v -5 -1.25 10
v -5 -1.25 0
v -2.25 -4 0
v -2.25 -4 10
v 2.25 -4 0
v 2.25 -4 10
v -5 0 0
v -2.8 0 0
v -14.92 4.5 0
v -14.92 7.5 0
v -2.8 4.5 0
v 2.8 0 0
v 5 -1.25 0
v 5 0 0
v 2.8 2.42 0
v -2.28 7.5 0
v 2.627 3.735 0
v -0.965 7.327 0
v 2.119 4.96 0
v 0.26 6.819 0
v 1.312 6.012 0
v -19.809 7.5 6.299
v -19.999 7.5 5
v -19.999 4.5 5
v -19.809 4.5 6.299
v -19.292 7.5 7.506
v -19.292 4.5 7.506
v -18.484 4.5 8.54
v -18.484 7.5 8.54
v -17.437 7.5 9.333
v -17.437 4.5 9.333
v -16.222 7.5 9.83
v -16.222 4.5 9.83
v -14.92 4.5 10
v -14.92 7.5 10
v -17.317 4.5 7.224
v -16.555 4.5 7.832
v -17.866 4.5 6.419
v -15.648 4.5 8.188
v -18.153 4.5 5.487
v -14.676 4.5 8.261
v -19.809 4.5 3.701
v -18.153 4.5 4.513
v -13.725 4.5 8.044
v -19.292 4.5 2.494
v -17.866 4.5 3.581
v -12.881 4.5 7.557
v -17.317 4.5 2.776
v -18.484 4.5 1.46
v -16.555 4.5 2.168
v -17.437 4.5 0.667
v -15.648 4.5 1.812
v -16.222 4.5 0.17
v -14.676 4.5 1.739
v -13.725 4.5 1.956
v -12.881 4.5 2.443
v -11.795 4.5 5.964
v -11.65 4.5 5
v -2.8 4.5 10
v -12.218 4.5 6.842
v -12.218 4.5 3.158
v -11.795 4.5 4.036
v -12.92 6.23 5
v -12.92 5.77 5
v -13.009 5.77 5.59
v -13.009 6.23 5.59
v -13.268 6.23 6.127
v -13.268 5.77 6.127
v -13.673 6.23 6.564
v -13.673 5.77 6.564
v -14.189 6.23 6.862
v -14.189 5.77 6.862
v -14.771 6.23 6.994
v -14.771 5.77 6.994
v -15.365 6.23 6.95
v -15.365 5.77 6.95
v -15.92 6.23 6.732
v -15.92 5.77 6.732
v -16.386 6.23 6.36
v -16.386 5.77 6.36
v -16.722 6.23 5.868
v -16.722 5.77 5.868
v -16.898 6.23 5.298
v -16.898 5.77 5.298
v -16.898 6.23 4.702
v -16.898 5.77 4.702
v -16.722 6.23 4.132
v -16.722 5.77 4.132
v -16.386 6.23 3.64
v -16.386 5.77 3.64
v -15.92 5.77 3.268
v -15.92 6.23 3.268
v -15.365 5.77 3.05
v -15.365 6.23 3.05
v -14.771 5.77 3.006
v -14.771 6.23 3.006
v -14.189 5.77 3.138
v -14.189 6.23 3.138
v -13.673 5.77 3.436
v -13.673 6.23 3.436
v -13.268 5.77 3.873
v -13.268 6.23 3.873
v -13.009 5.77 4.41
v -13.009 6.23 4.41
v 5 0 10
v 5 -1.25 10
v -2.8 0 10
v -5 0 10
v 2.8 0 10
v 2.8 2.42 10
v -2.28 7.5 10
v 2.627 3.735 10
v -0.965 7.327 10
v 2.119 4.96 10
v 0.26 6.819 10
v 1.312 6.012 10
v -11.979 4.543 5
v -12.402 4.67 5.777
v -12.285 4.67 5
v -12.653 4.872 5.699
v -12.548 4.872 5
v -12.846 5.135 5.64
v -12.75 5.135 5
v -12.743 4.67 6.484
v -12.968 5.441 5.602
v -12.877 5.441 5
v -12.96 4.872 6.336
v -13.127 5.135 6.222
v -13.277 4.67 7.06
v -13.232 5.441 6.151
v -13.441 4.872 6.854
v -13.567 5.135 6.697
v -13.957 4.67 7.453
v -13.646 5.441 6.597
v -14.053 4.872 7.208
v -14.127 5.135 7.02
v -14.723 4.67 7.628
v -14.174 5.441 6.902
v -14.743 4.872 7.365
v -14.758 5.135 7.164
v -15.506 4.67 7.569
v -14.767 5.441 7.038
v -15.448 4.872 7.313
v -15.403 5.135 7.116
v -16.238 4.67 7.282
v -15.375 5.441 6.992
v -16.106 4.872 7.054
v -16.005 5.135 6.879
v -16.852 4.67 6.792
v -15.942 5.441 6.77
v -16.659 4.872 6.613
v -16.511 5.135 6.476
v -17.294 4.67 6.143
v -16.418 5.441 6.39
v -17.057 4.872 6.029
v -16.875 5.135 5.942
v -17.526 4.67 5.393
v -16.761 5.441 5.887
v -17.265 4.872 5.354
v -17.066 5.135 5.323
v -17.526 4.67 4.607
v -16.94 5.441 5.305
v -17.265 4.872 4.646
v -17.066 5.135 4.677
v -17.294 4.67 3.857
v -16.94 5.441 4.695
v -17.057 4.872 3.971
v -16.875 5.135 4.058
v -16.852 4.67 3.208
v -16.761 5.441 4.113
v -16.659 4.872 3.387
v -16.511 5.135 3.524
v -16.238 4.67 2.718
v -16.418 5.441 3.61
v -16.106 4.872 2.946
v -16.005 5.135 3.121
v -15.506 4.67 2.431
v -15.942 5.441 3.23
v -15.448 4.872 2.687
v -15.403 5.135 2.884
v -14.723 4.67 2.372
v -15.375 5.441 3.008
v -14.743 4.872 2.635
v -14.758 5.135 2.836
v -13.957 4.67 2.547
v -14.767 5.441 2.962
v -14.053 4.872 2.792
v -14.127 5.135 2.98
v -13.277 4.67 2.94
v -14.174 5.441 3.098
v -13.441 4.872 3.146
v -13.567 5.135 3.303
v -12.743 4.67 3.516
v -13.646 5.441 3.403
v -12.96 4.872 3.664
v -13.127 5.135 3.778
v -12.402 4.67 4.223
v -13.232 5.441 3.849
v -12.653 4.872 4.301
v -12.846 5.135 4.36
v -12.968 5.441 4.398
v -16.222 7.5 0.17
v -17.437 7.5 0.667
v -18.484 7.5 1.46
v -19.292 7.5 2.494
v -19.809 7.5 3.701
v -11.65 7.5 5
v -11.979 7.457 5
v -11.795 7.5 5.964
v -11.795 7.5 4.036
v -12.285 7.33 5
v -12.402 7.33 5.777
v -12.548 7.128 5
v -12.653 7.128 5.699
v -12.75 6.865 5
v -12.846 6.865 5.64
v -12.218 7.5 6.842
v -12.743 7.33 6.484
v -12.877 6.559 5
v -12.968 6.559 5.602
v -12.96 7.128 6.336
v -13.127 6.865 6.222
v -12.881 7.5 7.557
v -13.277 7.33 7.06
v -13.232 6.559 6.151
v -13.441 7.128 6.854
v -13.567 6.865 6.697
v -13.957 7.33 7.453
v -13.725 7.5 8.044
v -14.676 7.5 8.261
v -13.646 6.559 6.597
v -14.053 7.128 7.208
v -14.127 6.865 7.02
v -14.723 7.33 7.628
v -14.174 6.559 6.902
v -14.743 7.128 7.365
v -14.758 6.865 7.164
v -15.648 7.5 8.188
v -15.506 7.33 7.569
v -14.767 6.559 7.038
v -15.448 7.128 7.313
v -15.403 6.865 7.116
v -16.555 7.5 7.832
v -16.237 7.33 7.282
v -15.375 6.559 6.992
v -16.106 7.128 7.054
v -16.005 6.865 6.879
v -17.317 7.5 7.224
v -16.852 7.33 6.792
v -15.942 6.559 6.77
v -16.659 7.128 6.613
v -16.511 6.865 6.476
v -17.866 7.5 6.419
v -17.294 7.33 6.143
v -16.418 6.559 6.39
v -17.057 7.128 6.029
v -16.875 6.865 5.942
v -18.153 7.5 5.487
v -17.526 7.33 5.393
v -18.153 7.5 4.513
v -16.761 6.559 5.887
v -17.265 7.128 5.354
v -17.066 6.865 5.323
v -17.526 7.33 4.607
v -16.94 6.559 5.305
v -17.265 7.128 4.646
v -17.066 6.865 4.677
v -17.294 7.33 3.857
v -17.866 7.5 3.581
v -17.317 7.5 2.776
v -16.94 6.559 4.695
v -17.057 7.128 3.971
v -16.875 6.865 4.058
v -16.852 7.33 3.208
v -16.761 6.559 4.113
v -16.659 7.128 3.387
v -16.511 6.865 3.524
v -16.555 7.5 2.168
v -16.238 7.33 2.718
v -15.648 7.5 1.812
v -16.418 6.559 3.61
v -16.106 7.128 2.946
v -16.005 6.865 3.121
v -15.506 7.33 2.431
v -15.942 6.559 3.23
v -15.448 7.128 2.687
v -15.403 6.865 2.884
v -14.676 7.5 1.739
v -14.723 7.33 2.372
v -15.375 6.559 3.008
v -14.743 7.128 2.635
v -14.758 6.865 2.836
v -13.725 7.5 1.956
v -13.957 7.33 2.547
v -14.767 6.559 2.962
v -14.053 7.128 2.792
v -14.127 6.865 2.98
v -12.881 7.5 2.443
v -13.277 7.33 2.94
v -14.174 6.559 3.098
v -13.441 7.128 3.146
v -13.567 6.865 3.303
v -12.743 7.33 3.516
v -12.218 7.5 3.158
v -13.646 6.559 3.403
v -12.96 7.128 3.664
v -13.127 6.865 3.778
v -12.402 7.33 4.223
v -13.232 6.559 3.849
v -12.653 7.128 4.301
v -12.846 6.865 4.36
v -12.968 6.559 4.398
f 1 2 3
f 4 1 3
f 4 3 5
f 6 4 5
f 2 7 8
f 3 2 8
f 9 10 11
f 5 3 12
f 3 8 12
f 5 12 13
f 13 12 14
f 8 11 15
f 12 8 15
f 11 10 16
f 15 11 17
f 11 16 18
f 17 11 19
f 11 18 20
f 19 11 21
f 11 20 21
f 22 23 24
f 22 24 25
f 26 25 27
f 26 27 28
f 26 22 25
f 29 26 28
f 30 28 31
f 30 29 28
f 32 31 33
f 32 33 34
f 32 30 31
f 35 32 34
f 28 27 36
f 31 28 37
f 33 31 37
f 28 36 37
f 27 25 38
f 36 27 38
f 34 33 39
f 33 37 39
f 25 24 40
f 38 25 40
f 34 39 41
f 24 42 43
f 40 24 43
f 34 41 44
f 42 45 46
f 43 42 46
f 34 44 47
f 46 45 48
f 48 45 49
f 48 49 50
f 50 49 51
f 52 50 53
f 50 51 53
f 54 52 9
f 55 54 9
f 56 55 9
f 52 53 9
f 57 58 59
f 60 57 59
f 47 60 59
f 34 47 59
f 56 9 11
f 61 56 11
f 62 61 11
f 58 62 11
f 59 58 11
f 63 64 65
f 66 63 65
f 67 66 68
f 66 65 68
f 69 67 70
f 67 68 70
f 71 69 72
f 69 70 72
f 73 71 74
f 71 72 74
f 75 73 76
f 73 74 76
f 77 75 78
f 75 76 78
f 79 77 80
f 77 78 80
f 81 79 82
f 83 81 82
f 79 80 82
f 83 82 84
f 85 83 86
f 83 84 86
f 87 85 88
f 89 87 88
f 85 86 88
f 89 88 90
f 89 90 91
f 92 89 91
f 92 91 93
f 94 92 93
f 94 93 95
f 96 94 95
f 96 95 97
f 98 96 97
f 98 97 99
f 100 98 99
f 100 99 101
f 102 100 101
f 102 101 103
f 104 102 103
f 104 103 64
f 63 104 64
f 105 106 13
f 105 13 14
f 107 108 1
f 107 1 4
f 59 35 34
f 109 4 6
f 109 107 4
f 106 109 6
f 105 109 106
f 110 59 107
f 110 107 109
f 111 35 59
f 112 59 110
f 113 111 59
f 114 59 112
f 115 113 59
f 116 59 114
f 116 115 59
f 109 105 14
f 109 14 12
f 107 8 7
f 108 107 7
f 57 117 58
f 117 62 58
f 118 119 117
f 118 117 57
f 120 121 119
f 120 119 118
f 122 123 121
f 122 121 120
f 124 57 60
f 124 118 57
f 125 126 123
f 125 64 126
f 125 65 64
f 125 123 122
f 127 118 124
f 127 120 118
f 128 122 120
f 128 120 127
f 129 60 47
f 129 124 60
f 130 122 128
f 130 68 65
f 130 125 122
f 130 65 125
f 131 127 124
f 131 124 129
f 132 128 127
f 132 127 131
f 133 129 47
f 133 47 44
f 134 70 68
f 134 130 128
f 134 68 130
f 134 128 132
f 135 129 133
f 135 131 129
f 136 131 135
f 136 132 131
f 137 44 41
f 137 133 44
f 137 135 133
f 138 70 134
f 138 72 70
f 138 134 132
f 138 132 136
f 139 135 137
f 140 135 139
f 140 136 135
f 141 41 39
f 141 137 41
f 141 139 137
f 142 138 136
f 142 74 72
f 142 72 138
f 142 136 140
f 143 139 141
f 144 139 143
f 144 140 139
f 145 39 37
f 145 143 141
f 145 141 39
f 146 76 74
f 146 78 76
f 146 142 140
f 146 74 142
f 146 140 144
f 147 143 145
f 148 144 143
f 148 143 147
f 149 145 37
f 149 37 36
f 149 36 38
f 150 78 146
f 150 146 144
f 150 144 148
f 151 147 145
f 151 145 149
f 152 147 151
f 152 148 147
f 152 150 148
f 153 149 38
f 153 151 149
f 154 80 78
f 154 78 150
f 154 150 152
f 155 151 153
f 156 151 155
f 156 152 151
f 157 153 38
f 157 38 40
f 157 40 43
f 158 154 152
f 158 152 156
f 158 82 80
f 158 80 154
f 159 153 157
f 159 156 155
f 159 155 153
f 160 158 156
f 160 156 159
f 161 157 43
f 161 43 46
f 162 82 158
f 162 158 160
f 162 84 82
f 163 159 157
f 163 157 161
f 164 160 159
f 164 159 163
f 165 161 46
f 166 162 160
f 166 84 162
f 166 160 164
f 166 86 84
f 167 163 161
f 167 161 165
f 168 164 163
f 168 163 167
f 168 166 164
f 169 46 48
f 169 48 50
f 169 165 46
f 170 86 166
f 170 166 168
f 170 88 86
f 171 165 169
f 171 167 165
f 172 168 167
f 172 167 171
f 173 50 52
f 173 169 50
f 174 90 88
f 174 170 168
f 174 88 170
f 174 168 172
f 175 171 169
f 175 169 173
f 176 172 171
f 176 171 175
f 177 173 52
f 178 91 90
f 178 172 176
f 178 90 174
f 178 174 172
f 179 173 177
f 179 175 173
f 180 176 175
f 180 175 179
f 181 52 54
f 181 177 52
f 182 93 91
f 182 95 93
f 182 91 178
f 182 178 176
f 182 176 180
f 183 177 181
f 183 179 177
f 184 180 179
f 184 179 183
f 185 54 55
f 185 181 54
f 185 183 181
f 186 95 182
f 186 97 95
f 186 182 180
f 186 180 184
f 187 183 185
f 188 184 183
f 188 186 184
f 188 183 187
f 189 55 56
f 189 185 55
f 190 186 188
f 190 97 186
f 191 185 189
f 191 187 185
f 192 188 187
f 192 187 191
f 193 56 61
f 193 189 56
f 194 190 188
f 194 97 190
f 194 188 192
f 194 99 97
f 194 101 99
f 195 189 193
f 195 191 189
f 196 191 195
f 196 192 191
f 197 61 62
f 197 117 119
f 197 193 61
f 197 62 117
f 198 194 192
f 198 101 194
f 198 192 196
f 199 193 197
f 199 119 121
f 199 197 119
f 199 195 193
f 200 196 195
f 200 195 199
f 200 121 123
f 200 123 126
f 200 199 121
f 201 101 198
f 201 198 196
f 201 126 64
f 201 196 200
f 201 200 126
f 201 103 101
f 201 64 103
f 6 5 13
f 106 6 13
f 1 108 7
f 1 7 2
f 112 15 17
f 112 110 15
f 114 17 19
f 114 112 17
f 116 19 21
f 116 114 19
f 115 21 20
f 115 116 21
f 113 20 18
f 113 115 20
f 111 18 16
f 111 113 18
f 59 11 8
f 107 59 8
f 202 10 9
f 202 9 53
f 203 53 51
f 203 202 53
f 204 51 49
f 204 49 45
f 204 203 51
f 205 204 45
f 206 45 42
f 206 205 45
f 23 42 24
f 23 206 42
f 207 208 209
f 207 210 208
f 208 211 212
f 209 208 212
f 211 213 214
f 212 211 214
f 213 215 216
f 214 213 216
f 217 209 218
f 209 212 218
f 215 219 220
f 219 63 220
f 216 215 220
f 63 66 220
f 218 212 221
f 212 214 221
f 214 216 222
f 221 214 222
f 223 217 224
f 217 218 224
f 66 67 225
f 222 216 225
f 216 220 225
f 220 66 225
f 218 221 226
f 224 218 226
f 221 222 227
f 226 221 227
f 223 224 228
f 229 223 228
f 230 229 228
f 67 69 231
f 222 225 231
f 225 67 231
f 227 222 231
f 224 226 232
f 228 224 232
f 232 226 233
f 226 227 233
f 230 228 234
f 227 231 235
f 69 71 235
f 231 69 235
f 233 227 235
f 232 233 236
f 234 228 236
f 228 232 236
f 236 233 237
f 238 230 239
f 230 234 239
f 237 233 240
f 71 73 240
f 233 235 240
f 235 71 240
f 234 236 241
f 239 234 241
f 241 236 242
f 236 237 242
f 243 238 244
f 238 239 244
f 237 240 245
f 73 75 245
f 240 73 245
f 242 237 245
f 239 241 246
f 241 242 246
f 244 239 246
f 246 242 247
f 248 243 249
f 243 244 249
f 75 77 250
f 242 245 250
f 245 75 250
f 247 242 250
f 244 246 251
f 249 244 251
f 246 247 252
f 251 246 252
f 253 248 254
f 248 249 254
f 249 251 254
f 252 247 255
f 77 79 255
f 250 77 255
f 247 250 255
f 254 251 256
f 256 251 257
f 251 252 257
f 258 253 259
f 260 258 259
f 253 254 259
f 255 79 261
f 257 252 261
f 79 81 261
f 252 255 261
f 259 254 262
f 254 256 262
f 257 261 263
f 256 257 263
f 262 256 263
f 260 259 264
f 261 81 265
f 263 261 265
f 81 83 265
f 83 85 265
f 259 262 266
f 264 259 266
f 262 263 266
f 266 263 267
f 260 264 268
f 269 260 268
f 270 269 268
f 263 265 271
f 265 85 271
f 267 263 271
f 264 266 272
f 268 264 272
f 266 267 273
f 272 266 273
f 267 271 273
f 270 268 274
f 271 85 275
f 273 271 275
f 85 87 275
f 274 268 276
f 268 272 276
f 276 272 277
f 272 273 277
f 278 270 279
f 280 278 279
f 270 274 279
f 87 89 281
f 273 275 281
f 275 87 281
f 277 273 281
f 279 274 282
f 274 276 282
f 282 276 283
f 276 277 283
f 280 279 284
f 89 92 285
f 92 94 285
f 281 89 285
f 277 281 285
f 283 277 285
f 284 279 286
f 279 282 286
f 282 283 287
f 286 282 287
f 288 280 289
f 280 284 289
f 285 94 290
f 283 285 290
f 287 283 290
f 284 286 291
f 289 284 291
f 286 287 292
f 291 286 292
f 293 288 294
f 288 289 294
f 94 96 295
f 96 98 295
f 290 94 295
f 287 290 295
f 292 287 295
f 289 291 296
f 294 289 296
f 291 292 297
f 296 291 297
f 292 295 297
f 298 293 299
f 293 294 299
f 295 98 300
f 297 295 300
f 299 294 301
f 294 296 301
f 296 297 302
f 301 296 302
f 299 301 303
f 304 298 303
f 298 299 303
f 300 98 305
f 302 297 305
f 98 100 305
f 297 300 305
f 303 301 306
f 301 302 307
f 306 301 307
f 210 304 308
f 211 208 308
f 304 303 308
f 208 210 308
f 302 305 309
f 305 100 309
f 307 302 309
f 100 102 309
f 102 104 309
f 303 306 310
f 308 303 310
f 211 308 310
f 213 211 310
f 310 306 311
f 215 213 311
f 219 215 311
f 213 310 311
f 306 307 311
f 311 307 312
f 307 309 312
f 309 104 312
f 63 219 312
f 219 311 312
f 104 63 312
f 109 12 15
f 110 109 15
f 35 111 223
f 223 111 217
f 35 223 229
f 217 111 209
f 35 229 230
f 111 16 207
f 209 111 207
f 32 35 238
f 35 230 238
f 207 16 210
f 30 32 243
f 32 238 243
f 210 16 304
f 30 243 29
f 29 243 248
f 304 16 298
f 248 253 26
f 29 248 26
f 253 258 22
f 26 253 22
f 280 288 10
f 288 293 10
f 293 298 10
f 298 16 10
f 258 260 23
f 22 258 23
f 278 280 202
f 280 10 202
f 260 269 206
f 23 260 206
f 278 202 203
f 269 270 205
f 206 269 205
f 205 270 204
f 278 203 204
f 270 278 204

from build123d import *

# Parameters (mm, degrees)
F1_DEPTH    = 10
F2_R        = 5.08
F3_T1_DEPTH = 28.4
F4_R        = 2
F5_DEPTH    = 25.4
F6_R        = 1.27


# Not quite as in the source:
# - a fillet or chamfer that OpenCascade refuses, or shapes differently, is made with other operations: its cross-section is extruded or revolved along the edge and cut away or added


with BuildPart() as f1:
    # F0 (on Top) → F1 (new body)
    with BuildSketch(Plane.XY):
        Polygon((-2.25, -4), (0, -4), (2.25, -4), (5, -1.25), (5, 0), (2.8, 0), (2.8, 4), (2.8, 7.5), (-20, 7.5), (-20, 4.5), (-2.8, 4.5), (-2.8, 4), (-2.8, 0), (-5, 0), (-5, -1.25), align=None)
    extrude(amount=F1_DEPTH)

    # F2
    f2_edges = [f1.edges().sort_by_distance(p)[0] for p in [
        (2.8, 7.5, 5),
    ]]
    fillet(f2_edges, radius=F2_R)

    # F3: fillet of radius 5.08 on 2 edges, made by hand

    # F3_s2 → F3_t1 (cut)
    with BuildSketch(Plane.XZ.offset(-20.2)):
        with BuildLine():
            ThreePointArc((-20, 4.92), (-18.5121024484, 8.5121024484), (-14.92, 10))
            Line((-14.92, 10), (-20, 10))
            Line((-20, 10), (-20, 4.92))
        make_face()
        with BuildLine():
            ThreePointArc((-14.92, 0), (-18.5121024484, 1.4878975516), (-20, 5.08))
            Line((-20, 5.08), (-20, 0))
            Line((-20, 0), (-14.92, 0))
        make_face()
    extrude(amount=F3_T1_DEPTH, mode=Mode.SUBTRACT)

    # F4 (on face) → F5 (cut)
    with BuildSketch(Plane.XZ.offset(-4.5)):
        with Locations((-14.92, 5)):
            Circle(F4_R)
    extrude(amount=-F5_DEPTH, mode=Mode.SUBTRACT)

    # F6
    f6_edges = [f1.edges().sort_by_distance(p)[0] for p in [
        (-16.92, 4.5, 5),
        (-16.92, 7.5, 5),
    ]]
    fillet(f6_edges, radius=F6_R)


solid = f1.part
